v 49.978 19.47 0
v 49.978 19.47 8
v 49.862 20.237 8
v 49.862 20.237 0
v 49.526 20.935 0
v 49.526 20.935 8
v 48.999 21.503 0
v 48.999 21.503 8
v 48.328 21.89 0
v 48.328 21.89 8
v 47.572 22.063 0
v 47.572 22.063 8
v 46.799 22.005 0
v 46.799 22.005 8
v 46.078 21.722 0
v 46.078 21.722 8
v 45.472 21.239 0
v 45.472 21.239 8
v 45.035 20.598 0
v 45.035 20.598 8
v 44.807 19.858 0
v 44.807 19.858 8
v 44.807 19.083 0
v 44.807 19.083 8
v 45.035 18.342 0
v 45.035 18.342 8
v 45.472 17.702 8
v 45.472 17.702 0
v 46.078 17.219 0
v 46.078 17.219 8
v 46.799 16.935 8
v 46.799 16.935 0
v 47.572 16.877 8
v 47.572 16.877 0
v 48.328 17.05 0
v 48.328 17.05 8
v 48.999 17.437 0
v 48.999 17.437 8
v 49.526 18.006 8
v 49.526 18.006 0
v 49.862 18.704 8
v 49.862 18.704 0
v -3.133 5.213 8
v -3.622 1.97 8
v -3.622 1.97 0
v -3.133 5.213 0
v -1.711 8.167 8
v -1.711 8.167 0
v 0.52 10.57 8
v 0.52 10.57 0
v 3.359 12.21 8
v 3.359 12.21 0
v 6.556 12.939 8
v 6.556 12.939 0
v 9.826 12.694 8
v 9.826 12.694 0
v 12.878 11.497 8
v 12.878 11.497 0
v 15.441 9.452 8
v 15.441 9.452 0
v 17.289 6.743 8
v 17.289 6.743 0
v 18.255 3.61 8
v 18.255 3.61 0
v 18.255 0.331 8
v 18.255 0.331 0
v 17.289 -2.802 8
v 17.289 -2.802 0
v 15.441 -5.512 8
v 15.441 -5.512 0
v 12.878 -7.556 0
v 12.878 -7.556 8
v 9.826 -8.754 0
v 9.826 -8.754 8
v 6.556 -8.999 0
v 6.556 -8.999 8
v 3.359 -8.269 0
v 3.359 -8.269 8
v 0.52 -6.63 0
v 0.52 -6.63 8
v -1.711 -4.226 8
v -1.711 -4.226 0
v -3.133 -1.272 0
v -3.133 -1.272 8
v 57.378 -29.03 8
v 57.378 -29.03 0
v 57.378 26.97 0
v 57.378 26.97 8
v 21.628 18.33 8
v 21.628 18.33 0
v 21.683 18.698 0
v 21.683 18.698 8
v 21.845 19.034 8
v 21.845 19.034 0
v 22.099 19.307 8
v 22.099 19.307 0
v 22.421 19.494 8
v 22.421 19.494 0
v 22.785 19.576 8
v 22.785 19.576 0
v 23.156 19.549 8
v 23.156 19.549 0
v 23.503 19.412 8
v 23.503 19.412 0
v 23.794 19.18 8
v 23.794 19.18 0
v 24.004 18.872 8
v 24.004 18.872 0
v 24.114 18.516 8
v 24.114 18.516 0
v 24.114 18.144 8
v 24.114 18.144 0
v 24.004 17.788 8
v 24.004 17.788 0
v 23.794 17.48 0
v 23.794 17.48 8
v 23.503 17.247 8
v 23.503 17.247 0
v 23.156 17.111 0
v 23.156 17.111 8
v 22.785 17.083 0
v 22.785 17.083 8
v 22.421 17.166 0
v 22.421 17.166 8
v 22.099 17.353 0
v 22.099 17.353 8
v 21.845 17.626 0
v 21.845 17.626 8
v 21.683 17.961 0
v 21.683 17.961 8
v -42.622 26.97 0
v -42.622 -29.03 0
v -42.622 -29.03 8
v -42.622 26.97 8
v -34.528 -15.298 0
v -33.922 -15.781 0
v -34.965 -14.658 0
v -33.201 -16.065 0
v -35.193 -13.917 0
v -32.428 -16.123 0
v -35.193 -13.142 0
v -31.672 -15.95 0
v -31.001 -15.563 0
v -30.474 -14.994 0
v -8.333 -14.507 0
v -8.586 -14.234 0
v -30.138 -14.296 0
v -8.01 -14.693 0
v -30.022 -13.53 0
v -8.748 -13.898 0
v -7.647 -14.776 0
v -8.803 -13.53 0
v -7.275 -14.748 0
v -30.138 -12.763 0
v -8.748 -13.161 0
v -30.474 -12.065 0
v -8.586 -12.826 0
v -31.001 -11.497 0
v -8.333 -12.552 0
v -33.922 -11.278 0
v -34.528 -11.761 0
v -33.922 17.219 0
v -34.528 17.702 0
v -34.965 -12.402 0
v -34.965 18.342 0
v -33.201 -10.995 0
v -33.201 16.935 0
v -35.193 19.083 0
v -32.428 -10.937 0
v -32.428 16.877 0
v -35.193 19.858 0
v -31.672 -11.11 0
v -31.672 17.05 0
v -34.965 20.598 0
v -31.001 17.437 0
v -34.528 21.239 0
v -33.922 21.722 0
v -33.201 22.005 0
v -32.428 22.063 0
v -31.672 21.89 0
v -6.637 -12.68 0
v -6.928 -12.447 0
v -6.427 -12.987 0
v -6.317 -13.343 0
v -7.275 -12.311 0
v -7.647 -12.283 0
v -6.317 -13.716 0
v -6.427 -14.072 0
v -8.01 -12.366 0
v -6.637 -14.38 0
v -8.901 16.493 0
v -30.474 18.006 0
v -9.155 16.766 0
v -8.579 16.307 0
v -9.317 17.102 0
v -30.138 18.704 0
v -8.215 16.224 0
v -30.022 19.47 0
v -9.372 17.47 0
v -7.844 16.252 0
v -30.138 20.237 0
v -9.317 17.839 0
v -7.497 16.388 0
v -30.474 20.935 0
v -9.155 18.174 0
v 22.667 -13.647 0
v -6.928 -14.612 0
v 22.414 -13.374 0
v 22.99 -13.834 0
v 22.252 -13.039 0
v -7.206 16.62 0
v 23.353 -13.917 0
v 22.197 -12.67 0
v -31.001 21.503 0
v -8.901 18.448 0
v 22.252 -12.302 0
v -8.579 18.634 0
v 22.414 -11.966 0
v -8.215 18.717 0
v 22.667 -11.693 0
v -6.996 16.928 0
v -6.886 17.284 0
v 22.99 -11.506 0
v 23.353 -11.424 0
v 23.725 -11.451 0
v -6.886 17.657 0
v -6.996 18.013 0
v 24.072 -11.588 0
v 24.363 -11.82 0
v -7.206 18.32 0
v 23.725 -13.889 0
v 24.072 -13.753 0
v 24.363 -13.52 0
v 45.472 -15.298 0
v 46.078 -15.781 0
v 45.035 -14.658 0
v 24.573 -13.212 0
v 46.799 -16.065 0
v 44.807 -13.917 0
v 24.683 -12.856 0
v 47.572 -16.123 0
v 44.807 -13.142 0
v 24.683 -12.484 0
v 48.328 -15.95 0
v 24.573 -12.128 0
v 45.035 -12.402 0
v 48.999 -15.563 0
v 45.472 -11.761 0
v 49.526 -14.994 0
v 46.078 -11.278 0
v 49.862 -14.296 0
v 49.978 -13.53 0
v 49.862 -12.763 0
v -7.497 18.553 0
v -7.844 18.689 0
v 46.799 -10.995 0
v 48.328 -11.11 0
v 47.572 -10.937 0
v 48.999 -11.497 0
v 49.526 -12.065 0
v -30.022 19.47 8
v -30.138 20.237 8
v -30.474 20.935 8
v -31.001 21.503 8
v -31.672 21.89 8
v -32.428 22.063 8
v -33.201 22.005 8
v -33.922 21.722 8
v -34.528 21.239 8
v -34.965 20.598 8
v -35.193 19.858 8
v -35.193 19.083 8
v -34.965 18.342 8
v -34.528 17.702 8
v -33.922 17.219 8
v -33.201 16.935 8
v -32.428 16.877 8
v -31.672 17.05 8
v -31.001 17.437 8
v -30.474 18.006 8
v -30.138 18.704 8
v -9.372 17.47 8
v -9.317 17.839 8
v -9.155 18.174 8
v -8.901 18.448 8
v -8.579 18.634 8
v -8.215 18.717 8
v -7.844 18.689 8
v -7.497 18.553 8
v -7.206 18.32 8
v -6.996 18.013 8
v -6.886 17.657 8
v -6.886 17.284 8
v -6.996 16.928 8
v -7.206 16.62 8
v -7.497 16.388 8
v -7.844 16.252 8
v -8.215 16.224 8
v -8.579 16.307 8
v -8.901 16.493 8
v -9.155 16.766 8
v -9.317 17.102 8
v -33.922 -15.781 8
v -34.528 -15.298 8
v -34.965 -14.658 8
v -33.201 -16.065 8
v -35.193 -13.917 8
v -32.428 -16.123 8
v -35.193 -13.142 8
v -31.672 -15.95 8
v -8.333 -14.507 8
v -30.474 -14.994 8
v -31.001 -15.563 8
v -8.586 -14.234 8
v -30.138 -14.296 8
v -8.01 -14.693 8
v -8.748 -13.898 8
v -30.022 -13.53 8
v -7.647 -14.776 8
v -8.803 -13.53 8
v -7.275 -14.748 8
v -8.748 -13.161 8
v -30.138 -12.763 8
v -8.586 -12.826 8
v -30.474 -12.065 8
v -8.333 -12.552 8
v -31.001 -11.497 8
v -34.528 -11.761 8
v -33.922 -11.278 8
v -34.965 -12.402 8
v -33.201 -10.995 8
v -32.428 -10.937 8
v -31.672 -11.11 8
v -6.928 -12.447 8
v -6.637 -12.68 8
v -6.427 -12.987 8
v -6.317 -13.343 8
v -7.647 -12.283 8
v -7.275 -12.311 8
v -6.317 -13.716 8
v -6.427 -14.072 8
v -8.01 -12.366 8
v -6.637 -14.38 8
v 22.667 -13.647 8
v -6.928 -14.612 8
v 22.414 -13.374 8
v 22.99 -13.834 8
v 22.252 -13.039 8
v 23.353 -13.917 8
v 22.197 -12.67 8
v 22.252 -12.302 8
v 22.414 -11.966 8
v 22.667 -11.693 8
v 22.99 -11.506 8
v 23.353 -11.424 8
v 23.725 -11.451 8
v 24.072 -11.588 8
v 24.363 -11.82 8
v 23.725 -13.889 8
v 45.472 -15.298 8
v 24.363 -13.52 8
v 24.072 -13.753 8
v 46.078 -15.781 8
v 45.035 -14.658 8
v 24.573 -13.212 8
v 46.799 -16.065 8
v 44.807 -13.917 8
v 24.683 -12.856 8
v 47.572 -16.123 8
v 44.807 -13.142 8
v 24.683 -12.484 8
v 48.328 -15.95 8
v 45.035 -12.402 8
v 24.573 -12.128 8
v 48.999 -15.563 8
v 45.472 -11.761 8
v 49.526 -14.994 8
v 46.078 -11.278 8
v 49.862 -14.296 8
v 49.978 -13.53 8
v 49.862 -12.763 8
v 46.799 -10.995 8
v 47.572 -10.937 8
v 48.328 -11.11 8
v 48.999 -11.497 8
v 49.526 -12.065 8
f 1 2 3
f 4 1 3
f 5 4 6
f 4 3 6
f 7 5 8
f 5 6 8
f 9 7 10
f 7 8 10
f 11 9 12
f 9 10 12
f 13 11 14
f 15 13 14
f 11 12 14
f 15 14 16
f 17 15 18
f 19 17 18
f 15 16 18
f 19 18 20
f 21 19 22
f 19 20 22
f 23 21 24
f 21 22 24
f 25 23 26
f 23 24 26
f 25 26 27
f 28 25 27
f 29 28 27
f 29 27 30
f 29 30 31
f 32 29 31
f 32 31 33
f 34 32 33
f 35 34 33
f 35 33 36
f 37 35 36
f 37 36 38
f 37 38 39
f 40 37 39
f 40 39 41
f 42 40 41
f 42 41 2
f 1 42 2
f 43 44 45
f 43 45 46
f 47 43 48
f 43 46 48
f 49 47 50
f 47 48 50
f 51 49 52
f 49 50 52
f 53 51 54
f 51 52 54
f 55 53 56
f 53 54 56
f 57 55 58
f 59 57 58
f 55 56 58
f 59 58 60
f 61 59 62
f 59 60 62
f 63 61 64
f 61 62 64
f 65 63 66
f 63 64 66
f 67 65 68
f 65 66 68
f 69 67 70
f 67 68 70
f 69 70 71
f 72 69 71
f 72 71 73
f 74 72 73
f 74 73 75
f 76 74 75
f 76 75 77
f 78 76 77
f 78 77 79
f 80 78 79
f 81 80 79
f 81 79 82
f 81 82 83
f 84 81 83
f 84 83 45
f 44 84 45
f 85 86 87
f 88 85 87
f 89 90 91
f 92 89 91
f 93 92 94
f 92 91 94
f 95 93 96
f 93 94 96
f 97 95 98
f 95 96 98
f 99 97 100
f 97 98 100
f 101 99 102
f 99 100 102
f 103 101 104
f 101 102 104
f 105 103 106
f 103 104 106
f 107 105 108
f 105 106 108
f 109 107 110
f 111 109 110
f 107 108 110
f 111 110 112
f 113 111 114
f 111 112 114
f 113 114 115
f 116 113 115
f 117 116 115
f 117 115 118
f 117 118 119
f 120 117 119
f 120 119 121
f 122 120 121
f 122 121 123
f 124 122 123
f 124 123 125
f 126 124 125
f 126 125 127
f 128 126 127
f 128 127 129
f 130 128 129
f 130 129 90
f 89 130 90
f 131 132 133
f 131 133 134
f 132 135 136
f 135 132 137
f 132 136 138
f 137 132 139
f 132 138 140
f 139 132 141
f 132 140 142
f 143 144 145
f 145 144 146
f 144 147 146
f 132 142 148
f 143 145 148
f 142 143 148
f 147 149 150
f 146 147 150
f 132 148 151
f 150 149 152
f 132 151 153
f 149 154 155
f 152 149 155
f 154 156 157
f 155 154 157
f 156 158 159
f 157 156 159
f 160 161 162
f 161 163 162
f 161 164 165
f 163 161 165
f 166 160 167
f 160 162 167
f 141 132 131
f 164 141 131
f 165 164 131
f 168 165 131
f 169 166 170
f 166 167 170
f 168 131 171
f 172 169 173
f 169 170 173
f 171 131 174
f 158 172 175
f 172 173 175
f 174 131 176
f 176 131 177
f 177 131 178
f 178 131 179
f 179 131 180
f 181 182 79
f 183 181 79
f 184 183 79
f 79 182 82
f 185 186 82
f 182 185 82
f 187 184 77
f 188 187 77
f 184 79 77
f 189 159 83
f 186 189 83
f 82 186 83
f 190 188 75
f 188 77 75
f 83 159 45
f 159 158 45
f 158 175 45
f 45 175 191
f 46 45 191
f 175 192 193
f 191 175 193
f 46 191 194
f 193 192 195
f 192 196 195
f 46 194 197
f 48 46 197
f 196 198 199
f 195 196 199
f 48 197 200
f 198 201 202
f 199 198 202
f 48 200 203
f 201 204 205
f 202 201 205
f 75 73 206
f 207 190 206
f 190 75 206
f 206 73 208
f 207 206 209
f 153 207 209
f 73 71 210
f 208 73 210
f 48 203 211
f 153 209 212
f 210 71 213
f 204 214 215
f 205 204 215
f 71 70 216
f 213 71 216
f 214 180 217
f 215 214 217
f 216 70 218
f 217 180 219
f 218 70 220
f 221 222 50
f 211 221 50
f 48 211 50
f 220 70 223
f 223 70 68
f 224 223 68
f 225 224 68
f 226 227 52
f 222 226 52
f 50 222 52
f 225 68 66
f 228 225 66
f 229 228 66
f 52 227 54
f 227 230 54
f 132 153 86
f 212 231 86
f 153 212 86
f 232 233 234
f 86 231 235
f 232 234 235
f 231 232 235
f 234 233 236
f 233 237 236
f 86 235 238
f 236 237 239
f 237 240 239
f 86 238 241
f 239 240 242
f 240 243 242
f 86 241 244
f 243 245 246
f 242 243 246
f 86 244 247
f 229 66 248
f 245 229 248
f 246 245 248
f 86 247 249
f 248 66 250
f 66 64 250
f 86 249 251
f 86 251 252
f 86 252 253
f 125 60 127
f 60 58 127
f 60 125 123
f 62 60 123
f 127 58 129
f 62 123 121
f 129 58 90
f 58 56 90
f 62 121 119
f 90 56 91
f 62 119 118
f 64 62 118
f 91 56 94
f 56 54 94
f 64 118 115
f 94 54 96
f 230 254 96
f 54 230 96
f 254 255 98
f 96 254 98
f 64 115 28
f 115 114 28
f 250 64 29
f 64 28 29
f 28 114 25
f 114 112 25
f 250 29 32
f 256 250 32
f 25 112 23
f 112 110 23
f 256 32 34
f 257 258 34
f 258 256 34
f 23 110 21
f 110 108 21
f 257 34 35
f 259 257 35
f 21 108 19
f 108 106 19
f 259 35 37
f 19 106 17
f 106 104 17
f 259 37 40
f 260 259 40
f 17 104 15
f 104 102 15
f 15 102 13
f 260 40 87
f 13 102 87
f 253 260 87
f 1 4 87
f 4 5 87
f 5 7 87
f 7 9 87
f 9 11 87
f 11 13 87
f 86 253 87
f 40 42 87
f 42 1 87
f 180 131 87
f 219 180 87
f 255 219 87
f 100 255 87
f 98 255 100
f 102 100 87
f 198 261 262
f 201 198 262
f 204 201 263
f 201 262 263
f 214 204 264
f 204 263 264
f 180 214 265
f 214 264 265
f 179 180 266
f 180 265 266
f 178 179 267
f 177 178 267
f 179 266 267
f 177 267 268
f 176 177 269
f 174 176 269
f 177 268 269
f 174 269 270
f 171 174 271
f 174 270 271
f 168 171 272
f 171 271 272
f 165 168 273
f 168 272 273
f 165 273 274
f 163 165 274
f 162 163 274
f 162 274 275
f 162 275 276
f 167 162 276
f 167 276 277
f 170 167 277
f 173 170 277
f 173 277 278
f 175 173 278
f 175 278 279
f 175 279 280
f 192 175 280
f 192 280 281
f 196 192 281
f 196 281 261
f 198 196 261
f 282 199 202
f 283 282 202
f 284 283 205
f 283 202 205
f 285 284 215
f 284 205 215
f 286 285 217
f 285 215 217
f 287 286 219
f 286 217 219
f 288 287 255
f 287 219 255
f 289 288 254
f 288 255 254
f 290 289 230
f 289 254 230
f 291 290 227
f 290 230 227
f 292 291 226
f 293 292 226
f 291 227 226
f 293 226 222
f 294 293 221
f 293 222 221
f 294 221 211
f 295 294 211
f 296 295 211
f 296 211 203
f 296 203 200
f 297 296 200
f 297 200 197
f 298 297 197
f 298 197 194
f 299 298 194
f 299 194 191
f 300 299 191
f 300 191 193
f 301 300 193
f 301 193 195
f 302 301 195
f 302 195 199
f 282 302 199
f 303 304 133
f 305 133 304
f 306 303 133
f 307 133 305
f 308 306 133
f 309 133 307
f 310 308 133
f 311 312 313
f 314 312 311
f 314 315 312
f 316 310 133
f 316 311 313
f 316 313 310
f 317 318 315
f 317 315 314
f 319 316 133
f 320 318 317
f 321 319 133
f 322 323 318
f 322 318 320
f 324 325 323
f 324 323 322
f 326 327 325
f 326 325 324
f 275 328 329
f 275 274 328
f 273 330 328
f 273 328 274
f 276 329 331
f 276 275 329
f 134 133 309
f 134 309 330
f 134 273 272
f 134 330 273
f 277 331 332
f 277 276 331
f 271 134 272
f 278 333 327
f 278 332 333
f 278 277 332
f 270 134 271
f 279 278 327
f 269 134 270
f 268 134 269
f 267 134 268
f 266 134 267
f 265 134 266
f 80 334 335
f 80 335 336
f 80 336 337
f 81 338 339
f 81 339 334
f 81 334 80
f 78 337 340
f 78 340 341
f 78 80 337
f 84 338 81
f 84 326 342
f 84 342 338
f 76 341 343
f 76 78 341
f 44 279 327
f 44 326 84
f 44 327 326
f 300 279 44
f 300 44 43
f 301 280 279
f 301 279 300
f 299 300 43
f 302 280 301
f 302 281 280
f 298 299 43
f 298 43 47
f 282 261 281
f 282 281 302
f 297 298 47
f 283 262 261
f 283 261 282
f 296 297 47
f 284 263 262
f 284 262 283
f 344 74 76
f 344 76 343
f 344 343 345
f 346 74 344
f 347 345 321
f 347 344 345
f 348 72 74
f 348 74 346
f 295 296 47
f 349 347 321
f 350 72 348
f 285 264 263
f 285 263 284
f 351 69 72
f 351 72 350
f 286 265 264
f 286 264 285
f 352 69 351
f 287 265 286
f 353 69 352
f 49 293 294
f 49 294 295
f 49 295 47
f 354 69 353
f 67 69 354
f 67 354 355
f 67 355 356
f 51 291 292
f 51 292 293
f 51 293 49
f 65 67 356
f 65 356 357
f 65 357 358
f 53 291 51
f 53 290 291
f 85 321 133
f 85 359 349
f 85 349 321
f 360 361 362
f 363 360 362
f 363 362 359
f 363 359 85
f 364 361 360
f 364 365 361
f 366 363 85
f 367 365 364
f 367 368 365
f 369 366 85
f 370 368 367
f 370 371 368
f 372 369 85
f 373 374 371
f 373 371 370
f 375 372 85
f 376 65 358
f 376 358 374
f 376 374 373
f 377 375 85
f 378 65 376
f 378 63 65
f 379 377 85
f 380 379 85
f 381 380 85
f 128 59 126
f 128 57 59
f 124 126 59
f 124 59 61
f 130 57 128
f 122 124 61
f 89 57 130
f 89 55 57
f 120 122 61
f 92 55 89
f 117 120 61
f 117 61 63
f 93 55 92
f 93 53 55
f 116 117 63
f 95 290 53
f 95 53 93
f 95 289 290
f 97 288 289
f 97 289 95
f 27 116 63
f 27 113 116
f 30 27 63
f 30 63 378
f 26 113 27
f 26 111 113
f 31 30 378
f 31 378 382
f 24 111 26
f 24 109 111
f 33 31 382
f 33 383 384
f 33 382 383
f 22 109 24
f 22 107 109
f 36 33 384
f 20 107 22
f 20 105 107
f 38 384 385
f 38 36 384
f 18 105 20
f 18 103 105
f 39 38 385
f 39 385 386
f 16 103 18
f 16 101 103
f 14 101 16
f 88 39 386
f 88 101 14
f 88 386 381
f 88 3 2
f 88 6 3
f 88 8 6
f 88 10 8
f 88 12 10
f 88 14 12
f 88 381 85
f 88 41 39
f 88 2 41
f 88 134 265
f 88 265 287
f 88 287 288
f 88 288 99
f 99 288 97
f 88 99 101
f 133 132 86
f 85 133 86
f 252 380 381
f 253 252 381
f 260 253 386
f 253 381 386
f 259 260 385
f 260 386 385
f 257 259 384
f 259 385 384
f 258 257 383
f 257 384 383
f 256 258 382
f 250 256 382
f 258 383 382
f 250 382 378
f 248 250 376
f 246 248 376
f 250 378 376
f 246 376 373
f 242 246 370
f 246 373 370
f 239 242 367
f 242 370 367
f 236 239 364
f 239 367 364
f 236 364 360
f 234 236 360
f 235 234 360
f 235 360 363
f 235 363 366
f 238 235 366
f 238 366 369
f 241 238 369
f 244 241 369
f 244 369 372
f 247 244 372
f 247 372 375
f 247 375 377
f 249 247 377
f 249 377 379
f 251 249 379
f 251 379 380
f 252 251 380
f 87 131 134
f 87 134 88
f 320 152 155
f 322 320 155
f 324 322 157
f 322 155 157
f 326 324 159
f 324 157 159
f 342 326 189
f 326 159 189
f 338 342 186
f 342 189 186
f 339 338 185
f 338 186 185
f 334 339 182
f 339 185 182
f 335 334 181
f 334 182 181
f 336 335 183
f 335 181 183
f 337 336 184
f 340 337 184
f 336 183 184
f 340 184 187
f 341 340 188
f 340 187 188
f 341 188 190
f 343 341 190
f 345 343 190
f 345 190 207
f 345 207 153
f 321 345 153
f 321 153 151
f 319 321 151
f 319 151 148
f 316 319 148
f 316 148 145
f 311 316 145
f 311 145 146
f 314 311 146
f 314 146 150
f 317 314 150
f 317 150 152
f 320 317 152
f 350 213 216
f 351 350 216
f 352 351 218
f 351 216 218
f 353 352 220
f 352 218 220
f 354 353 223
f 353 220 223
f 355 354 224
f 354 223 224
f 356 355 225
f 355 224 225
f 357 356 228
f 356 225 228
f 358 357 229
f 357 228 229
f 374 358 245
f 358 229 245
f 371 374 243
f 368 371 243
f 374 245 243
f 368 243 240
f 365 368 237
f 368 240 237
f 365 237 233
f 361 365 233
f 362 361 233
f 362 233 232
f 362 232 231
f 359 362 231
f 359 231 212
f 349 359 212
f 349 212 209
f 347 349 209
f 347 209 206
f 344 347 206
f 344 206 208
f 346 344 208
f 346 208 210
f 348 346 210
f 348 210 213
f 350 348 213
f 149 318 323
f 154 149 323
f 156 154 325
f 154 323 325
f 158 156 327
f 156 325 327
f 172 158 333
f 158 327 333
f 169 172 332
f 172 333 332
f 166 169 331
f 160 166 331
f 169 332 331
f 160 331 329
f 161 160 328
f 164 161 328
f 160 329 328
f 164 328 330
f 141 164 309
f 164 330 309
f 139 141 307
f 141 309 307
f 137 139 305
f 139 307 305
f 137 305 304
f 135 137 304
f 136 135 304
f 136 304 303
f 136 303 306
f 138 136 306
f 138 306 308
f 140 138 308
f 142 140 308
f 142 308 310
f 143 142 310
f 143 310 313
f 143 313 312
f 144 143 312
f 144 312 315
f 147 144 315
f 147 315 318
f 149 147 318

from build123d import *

# Parameters (mm, degrees)
IZIM1_W                     = 100
IZIM1_H                     = 56
IZIM1_R                     = 2.883504547
Y_KSEKLIK_EKSTR_ZYON1_DEPTH = 8
IZIM2_R                     = 11
IZIM2_R_2                   = 1.25
KES_EKSTR_ZYON1_DEPTH       = 10
IZIM3_R                     = 2.6
KES_EKSTR_ZYON2_DEPTH       = 10


with BuildPart() as part:
    # Çizim1 → Yükseklik-Ekstrüzyon1 (new body)
    with BuildSketch(Plane.XY):
        with Locations((7.377917159, -1.029772329)):
            Rectangle(IZIM1_W, IZIM1_H)
        with Locations((7.377917159, 1.970227671)):
            Circle(IZIM1_R, mode=Mode.SUBTRACT)
    extrude(amount=Y_KSEKLIK_EKSTR_ZYON1_DEPTH)

    # Çizim2 → Kes-Ekstrüzyon1 (cut)
    with BuildSketch(Plane(origin=(0, 0, 0), x_dir=(-1, 0, 0), z_dir=(0, 0, -1))):
        with Locations((-7.377917159, 1.970227671)):
            Circle(IZIM2_R)
        with Locations((8.122082841, 17.470227671)):
            Circle(IZIM2_R_2)
        with Locations((7.553397723, -13.529772329)):
            Circle(IZIM2_R_2)
        with Locations((-23.446602277, -12.670089489)):
            Circle(IZIM2_R_2)
        with Locations((-22.877917159, 18.329910511)):
            Circle(IZIM2_R_2)
    extrude(amount=-KES_EKSTR_ZYON1_DEPTH, mode=Mode.SUBTRACT)

    # Çizim3 → Kes-Ekstrüzyon2 (cut)
    with BuildSketch(Plane.XY.offset(8)):
        with Locations((-32.622082841, 19.470227671)):
            Circle(IZIM3_R)
        with Locations((47.377917159, 19.470227671)):
            Circle(IZIM3_R)
        with Locations((47.377917159, -13.529772329)):
            Circle(IZIM3_R)
        with Locations((-32.622082841, -13.529772329)):
            Circle(IZIM3_R)
    extrude(amount=-KES_EKSTR_ZYON2_DEPTH, mode=Mode.SUBTRACT)


solid = part.part
